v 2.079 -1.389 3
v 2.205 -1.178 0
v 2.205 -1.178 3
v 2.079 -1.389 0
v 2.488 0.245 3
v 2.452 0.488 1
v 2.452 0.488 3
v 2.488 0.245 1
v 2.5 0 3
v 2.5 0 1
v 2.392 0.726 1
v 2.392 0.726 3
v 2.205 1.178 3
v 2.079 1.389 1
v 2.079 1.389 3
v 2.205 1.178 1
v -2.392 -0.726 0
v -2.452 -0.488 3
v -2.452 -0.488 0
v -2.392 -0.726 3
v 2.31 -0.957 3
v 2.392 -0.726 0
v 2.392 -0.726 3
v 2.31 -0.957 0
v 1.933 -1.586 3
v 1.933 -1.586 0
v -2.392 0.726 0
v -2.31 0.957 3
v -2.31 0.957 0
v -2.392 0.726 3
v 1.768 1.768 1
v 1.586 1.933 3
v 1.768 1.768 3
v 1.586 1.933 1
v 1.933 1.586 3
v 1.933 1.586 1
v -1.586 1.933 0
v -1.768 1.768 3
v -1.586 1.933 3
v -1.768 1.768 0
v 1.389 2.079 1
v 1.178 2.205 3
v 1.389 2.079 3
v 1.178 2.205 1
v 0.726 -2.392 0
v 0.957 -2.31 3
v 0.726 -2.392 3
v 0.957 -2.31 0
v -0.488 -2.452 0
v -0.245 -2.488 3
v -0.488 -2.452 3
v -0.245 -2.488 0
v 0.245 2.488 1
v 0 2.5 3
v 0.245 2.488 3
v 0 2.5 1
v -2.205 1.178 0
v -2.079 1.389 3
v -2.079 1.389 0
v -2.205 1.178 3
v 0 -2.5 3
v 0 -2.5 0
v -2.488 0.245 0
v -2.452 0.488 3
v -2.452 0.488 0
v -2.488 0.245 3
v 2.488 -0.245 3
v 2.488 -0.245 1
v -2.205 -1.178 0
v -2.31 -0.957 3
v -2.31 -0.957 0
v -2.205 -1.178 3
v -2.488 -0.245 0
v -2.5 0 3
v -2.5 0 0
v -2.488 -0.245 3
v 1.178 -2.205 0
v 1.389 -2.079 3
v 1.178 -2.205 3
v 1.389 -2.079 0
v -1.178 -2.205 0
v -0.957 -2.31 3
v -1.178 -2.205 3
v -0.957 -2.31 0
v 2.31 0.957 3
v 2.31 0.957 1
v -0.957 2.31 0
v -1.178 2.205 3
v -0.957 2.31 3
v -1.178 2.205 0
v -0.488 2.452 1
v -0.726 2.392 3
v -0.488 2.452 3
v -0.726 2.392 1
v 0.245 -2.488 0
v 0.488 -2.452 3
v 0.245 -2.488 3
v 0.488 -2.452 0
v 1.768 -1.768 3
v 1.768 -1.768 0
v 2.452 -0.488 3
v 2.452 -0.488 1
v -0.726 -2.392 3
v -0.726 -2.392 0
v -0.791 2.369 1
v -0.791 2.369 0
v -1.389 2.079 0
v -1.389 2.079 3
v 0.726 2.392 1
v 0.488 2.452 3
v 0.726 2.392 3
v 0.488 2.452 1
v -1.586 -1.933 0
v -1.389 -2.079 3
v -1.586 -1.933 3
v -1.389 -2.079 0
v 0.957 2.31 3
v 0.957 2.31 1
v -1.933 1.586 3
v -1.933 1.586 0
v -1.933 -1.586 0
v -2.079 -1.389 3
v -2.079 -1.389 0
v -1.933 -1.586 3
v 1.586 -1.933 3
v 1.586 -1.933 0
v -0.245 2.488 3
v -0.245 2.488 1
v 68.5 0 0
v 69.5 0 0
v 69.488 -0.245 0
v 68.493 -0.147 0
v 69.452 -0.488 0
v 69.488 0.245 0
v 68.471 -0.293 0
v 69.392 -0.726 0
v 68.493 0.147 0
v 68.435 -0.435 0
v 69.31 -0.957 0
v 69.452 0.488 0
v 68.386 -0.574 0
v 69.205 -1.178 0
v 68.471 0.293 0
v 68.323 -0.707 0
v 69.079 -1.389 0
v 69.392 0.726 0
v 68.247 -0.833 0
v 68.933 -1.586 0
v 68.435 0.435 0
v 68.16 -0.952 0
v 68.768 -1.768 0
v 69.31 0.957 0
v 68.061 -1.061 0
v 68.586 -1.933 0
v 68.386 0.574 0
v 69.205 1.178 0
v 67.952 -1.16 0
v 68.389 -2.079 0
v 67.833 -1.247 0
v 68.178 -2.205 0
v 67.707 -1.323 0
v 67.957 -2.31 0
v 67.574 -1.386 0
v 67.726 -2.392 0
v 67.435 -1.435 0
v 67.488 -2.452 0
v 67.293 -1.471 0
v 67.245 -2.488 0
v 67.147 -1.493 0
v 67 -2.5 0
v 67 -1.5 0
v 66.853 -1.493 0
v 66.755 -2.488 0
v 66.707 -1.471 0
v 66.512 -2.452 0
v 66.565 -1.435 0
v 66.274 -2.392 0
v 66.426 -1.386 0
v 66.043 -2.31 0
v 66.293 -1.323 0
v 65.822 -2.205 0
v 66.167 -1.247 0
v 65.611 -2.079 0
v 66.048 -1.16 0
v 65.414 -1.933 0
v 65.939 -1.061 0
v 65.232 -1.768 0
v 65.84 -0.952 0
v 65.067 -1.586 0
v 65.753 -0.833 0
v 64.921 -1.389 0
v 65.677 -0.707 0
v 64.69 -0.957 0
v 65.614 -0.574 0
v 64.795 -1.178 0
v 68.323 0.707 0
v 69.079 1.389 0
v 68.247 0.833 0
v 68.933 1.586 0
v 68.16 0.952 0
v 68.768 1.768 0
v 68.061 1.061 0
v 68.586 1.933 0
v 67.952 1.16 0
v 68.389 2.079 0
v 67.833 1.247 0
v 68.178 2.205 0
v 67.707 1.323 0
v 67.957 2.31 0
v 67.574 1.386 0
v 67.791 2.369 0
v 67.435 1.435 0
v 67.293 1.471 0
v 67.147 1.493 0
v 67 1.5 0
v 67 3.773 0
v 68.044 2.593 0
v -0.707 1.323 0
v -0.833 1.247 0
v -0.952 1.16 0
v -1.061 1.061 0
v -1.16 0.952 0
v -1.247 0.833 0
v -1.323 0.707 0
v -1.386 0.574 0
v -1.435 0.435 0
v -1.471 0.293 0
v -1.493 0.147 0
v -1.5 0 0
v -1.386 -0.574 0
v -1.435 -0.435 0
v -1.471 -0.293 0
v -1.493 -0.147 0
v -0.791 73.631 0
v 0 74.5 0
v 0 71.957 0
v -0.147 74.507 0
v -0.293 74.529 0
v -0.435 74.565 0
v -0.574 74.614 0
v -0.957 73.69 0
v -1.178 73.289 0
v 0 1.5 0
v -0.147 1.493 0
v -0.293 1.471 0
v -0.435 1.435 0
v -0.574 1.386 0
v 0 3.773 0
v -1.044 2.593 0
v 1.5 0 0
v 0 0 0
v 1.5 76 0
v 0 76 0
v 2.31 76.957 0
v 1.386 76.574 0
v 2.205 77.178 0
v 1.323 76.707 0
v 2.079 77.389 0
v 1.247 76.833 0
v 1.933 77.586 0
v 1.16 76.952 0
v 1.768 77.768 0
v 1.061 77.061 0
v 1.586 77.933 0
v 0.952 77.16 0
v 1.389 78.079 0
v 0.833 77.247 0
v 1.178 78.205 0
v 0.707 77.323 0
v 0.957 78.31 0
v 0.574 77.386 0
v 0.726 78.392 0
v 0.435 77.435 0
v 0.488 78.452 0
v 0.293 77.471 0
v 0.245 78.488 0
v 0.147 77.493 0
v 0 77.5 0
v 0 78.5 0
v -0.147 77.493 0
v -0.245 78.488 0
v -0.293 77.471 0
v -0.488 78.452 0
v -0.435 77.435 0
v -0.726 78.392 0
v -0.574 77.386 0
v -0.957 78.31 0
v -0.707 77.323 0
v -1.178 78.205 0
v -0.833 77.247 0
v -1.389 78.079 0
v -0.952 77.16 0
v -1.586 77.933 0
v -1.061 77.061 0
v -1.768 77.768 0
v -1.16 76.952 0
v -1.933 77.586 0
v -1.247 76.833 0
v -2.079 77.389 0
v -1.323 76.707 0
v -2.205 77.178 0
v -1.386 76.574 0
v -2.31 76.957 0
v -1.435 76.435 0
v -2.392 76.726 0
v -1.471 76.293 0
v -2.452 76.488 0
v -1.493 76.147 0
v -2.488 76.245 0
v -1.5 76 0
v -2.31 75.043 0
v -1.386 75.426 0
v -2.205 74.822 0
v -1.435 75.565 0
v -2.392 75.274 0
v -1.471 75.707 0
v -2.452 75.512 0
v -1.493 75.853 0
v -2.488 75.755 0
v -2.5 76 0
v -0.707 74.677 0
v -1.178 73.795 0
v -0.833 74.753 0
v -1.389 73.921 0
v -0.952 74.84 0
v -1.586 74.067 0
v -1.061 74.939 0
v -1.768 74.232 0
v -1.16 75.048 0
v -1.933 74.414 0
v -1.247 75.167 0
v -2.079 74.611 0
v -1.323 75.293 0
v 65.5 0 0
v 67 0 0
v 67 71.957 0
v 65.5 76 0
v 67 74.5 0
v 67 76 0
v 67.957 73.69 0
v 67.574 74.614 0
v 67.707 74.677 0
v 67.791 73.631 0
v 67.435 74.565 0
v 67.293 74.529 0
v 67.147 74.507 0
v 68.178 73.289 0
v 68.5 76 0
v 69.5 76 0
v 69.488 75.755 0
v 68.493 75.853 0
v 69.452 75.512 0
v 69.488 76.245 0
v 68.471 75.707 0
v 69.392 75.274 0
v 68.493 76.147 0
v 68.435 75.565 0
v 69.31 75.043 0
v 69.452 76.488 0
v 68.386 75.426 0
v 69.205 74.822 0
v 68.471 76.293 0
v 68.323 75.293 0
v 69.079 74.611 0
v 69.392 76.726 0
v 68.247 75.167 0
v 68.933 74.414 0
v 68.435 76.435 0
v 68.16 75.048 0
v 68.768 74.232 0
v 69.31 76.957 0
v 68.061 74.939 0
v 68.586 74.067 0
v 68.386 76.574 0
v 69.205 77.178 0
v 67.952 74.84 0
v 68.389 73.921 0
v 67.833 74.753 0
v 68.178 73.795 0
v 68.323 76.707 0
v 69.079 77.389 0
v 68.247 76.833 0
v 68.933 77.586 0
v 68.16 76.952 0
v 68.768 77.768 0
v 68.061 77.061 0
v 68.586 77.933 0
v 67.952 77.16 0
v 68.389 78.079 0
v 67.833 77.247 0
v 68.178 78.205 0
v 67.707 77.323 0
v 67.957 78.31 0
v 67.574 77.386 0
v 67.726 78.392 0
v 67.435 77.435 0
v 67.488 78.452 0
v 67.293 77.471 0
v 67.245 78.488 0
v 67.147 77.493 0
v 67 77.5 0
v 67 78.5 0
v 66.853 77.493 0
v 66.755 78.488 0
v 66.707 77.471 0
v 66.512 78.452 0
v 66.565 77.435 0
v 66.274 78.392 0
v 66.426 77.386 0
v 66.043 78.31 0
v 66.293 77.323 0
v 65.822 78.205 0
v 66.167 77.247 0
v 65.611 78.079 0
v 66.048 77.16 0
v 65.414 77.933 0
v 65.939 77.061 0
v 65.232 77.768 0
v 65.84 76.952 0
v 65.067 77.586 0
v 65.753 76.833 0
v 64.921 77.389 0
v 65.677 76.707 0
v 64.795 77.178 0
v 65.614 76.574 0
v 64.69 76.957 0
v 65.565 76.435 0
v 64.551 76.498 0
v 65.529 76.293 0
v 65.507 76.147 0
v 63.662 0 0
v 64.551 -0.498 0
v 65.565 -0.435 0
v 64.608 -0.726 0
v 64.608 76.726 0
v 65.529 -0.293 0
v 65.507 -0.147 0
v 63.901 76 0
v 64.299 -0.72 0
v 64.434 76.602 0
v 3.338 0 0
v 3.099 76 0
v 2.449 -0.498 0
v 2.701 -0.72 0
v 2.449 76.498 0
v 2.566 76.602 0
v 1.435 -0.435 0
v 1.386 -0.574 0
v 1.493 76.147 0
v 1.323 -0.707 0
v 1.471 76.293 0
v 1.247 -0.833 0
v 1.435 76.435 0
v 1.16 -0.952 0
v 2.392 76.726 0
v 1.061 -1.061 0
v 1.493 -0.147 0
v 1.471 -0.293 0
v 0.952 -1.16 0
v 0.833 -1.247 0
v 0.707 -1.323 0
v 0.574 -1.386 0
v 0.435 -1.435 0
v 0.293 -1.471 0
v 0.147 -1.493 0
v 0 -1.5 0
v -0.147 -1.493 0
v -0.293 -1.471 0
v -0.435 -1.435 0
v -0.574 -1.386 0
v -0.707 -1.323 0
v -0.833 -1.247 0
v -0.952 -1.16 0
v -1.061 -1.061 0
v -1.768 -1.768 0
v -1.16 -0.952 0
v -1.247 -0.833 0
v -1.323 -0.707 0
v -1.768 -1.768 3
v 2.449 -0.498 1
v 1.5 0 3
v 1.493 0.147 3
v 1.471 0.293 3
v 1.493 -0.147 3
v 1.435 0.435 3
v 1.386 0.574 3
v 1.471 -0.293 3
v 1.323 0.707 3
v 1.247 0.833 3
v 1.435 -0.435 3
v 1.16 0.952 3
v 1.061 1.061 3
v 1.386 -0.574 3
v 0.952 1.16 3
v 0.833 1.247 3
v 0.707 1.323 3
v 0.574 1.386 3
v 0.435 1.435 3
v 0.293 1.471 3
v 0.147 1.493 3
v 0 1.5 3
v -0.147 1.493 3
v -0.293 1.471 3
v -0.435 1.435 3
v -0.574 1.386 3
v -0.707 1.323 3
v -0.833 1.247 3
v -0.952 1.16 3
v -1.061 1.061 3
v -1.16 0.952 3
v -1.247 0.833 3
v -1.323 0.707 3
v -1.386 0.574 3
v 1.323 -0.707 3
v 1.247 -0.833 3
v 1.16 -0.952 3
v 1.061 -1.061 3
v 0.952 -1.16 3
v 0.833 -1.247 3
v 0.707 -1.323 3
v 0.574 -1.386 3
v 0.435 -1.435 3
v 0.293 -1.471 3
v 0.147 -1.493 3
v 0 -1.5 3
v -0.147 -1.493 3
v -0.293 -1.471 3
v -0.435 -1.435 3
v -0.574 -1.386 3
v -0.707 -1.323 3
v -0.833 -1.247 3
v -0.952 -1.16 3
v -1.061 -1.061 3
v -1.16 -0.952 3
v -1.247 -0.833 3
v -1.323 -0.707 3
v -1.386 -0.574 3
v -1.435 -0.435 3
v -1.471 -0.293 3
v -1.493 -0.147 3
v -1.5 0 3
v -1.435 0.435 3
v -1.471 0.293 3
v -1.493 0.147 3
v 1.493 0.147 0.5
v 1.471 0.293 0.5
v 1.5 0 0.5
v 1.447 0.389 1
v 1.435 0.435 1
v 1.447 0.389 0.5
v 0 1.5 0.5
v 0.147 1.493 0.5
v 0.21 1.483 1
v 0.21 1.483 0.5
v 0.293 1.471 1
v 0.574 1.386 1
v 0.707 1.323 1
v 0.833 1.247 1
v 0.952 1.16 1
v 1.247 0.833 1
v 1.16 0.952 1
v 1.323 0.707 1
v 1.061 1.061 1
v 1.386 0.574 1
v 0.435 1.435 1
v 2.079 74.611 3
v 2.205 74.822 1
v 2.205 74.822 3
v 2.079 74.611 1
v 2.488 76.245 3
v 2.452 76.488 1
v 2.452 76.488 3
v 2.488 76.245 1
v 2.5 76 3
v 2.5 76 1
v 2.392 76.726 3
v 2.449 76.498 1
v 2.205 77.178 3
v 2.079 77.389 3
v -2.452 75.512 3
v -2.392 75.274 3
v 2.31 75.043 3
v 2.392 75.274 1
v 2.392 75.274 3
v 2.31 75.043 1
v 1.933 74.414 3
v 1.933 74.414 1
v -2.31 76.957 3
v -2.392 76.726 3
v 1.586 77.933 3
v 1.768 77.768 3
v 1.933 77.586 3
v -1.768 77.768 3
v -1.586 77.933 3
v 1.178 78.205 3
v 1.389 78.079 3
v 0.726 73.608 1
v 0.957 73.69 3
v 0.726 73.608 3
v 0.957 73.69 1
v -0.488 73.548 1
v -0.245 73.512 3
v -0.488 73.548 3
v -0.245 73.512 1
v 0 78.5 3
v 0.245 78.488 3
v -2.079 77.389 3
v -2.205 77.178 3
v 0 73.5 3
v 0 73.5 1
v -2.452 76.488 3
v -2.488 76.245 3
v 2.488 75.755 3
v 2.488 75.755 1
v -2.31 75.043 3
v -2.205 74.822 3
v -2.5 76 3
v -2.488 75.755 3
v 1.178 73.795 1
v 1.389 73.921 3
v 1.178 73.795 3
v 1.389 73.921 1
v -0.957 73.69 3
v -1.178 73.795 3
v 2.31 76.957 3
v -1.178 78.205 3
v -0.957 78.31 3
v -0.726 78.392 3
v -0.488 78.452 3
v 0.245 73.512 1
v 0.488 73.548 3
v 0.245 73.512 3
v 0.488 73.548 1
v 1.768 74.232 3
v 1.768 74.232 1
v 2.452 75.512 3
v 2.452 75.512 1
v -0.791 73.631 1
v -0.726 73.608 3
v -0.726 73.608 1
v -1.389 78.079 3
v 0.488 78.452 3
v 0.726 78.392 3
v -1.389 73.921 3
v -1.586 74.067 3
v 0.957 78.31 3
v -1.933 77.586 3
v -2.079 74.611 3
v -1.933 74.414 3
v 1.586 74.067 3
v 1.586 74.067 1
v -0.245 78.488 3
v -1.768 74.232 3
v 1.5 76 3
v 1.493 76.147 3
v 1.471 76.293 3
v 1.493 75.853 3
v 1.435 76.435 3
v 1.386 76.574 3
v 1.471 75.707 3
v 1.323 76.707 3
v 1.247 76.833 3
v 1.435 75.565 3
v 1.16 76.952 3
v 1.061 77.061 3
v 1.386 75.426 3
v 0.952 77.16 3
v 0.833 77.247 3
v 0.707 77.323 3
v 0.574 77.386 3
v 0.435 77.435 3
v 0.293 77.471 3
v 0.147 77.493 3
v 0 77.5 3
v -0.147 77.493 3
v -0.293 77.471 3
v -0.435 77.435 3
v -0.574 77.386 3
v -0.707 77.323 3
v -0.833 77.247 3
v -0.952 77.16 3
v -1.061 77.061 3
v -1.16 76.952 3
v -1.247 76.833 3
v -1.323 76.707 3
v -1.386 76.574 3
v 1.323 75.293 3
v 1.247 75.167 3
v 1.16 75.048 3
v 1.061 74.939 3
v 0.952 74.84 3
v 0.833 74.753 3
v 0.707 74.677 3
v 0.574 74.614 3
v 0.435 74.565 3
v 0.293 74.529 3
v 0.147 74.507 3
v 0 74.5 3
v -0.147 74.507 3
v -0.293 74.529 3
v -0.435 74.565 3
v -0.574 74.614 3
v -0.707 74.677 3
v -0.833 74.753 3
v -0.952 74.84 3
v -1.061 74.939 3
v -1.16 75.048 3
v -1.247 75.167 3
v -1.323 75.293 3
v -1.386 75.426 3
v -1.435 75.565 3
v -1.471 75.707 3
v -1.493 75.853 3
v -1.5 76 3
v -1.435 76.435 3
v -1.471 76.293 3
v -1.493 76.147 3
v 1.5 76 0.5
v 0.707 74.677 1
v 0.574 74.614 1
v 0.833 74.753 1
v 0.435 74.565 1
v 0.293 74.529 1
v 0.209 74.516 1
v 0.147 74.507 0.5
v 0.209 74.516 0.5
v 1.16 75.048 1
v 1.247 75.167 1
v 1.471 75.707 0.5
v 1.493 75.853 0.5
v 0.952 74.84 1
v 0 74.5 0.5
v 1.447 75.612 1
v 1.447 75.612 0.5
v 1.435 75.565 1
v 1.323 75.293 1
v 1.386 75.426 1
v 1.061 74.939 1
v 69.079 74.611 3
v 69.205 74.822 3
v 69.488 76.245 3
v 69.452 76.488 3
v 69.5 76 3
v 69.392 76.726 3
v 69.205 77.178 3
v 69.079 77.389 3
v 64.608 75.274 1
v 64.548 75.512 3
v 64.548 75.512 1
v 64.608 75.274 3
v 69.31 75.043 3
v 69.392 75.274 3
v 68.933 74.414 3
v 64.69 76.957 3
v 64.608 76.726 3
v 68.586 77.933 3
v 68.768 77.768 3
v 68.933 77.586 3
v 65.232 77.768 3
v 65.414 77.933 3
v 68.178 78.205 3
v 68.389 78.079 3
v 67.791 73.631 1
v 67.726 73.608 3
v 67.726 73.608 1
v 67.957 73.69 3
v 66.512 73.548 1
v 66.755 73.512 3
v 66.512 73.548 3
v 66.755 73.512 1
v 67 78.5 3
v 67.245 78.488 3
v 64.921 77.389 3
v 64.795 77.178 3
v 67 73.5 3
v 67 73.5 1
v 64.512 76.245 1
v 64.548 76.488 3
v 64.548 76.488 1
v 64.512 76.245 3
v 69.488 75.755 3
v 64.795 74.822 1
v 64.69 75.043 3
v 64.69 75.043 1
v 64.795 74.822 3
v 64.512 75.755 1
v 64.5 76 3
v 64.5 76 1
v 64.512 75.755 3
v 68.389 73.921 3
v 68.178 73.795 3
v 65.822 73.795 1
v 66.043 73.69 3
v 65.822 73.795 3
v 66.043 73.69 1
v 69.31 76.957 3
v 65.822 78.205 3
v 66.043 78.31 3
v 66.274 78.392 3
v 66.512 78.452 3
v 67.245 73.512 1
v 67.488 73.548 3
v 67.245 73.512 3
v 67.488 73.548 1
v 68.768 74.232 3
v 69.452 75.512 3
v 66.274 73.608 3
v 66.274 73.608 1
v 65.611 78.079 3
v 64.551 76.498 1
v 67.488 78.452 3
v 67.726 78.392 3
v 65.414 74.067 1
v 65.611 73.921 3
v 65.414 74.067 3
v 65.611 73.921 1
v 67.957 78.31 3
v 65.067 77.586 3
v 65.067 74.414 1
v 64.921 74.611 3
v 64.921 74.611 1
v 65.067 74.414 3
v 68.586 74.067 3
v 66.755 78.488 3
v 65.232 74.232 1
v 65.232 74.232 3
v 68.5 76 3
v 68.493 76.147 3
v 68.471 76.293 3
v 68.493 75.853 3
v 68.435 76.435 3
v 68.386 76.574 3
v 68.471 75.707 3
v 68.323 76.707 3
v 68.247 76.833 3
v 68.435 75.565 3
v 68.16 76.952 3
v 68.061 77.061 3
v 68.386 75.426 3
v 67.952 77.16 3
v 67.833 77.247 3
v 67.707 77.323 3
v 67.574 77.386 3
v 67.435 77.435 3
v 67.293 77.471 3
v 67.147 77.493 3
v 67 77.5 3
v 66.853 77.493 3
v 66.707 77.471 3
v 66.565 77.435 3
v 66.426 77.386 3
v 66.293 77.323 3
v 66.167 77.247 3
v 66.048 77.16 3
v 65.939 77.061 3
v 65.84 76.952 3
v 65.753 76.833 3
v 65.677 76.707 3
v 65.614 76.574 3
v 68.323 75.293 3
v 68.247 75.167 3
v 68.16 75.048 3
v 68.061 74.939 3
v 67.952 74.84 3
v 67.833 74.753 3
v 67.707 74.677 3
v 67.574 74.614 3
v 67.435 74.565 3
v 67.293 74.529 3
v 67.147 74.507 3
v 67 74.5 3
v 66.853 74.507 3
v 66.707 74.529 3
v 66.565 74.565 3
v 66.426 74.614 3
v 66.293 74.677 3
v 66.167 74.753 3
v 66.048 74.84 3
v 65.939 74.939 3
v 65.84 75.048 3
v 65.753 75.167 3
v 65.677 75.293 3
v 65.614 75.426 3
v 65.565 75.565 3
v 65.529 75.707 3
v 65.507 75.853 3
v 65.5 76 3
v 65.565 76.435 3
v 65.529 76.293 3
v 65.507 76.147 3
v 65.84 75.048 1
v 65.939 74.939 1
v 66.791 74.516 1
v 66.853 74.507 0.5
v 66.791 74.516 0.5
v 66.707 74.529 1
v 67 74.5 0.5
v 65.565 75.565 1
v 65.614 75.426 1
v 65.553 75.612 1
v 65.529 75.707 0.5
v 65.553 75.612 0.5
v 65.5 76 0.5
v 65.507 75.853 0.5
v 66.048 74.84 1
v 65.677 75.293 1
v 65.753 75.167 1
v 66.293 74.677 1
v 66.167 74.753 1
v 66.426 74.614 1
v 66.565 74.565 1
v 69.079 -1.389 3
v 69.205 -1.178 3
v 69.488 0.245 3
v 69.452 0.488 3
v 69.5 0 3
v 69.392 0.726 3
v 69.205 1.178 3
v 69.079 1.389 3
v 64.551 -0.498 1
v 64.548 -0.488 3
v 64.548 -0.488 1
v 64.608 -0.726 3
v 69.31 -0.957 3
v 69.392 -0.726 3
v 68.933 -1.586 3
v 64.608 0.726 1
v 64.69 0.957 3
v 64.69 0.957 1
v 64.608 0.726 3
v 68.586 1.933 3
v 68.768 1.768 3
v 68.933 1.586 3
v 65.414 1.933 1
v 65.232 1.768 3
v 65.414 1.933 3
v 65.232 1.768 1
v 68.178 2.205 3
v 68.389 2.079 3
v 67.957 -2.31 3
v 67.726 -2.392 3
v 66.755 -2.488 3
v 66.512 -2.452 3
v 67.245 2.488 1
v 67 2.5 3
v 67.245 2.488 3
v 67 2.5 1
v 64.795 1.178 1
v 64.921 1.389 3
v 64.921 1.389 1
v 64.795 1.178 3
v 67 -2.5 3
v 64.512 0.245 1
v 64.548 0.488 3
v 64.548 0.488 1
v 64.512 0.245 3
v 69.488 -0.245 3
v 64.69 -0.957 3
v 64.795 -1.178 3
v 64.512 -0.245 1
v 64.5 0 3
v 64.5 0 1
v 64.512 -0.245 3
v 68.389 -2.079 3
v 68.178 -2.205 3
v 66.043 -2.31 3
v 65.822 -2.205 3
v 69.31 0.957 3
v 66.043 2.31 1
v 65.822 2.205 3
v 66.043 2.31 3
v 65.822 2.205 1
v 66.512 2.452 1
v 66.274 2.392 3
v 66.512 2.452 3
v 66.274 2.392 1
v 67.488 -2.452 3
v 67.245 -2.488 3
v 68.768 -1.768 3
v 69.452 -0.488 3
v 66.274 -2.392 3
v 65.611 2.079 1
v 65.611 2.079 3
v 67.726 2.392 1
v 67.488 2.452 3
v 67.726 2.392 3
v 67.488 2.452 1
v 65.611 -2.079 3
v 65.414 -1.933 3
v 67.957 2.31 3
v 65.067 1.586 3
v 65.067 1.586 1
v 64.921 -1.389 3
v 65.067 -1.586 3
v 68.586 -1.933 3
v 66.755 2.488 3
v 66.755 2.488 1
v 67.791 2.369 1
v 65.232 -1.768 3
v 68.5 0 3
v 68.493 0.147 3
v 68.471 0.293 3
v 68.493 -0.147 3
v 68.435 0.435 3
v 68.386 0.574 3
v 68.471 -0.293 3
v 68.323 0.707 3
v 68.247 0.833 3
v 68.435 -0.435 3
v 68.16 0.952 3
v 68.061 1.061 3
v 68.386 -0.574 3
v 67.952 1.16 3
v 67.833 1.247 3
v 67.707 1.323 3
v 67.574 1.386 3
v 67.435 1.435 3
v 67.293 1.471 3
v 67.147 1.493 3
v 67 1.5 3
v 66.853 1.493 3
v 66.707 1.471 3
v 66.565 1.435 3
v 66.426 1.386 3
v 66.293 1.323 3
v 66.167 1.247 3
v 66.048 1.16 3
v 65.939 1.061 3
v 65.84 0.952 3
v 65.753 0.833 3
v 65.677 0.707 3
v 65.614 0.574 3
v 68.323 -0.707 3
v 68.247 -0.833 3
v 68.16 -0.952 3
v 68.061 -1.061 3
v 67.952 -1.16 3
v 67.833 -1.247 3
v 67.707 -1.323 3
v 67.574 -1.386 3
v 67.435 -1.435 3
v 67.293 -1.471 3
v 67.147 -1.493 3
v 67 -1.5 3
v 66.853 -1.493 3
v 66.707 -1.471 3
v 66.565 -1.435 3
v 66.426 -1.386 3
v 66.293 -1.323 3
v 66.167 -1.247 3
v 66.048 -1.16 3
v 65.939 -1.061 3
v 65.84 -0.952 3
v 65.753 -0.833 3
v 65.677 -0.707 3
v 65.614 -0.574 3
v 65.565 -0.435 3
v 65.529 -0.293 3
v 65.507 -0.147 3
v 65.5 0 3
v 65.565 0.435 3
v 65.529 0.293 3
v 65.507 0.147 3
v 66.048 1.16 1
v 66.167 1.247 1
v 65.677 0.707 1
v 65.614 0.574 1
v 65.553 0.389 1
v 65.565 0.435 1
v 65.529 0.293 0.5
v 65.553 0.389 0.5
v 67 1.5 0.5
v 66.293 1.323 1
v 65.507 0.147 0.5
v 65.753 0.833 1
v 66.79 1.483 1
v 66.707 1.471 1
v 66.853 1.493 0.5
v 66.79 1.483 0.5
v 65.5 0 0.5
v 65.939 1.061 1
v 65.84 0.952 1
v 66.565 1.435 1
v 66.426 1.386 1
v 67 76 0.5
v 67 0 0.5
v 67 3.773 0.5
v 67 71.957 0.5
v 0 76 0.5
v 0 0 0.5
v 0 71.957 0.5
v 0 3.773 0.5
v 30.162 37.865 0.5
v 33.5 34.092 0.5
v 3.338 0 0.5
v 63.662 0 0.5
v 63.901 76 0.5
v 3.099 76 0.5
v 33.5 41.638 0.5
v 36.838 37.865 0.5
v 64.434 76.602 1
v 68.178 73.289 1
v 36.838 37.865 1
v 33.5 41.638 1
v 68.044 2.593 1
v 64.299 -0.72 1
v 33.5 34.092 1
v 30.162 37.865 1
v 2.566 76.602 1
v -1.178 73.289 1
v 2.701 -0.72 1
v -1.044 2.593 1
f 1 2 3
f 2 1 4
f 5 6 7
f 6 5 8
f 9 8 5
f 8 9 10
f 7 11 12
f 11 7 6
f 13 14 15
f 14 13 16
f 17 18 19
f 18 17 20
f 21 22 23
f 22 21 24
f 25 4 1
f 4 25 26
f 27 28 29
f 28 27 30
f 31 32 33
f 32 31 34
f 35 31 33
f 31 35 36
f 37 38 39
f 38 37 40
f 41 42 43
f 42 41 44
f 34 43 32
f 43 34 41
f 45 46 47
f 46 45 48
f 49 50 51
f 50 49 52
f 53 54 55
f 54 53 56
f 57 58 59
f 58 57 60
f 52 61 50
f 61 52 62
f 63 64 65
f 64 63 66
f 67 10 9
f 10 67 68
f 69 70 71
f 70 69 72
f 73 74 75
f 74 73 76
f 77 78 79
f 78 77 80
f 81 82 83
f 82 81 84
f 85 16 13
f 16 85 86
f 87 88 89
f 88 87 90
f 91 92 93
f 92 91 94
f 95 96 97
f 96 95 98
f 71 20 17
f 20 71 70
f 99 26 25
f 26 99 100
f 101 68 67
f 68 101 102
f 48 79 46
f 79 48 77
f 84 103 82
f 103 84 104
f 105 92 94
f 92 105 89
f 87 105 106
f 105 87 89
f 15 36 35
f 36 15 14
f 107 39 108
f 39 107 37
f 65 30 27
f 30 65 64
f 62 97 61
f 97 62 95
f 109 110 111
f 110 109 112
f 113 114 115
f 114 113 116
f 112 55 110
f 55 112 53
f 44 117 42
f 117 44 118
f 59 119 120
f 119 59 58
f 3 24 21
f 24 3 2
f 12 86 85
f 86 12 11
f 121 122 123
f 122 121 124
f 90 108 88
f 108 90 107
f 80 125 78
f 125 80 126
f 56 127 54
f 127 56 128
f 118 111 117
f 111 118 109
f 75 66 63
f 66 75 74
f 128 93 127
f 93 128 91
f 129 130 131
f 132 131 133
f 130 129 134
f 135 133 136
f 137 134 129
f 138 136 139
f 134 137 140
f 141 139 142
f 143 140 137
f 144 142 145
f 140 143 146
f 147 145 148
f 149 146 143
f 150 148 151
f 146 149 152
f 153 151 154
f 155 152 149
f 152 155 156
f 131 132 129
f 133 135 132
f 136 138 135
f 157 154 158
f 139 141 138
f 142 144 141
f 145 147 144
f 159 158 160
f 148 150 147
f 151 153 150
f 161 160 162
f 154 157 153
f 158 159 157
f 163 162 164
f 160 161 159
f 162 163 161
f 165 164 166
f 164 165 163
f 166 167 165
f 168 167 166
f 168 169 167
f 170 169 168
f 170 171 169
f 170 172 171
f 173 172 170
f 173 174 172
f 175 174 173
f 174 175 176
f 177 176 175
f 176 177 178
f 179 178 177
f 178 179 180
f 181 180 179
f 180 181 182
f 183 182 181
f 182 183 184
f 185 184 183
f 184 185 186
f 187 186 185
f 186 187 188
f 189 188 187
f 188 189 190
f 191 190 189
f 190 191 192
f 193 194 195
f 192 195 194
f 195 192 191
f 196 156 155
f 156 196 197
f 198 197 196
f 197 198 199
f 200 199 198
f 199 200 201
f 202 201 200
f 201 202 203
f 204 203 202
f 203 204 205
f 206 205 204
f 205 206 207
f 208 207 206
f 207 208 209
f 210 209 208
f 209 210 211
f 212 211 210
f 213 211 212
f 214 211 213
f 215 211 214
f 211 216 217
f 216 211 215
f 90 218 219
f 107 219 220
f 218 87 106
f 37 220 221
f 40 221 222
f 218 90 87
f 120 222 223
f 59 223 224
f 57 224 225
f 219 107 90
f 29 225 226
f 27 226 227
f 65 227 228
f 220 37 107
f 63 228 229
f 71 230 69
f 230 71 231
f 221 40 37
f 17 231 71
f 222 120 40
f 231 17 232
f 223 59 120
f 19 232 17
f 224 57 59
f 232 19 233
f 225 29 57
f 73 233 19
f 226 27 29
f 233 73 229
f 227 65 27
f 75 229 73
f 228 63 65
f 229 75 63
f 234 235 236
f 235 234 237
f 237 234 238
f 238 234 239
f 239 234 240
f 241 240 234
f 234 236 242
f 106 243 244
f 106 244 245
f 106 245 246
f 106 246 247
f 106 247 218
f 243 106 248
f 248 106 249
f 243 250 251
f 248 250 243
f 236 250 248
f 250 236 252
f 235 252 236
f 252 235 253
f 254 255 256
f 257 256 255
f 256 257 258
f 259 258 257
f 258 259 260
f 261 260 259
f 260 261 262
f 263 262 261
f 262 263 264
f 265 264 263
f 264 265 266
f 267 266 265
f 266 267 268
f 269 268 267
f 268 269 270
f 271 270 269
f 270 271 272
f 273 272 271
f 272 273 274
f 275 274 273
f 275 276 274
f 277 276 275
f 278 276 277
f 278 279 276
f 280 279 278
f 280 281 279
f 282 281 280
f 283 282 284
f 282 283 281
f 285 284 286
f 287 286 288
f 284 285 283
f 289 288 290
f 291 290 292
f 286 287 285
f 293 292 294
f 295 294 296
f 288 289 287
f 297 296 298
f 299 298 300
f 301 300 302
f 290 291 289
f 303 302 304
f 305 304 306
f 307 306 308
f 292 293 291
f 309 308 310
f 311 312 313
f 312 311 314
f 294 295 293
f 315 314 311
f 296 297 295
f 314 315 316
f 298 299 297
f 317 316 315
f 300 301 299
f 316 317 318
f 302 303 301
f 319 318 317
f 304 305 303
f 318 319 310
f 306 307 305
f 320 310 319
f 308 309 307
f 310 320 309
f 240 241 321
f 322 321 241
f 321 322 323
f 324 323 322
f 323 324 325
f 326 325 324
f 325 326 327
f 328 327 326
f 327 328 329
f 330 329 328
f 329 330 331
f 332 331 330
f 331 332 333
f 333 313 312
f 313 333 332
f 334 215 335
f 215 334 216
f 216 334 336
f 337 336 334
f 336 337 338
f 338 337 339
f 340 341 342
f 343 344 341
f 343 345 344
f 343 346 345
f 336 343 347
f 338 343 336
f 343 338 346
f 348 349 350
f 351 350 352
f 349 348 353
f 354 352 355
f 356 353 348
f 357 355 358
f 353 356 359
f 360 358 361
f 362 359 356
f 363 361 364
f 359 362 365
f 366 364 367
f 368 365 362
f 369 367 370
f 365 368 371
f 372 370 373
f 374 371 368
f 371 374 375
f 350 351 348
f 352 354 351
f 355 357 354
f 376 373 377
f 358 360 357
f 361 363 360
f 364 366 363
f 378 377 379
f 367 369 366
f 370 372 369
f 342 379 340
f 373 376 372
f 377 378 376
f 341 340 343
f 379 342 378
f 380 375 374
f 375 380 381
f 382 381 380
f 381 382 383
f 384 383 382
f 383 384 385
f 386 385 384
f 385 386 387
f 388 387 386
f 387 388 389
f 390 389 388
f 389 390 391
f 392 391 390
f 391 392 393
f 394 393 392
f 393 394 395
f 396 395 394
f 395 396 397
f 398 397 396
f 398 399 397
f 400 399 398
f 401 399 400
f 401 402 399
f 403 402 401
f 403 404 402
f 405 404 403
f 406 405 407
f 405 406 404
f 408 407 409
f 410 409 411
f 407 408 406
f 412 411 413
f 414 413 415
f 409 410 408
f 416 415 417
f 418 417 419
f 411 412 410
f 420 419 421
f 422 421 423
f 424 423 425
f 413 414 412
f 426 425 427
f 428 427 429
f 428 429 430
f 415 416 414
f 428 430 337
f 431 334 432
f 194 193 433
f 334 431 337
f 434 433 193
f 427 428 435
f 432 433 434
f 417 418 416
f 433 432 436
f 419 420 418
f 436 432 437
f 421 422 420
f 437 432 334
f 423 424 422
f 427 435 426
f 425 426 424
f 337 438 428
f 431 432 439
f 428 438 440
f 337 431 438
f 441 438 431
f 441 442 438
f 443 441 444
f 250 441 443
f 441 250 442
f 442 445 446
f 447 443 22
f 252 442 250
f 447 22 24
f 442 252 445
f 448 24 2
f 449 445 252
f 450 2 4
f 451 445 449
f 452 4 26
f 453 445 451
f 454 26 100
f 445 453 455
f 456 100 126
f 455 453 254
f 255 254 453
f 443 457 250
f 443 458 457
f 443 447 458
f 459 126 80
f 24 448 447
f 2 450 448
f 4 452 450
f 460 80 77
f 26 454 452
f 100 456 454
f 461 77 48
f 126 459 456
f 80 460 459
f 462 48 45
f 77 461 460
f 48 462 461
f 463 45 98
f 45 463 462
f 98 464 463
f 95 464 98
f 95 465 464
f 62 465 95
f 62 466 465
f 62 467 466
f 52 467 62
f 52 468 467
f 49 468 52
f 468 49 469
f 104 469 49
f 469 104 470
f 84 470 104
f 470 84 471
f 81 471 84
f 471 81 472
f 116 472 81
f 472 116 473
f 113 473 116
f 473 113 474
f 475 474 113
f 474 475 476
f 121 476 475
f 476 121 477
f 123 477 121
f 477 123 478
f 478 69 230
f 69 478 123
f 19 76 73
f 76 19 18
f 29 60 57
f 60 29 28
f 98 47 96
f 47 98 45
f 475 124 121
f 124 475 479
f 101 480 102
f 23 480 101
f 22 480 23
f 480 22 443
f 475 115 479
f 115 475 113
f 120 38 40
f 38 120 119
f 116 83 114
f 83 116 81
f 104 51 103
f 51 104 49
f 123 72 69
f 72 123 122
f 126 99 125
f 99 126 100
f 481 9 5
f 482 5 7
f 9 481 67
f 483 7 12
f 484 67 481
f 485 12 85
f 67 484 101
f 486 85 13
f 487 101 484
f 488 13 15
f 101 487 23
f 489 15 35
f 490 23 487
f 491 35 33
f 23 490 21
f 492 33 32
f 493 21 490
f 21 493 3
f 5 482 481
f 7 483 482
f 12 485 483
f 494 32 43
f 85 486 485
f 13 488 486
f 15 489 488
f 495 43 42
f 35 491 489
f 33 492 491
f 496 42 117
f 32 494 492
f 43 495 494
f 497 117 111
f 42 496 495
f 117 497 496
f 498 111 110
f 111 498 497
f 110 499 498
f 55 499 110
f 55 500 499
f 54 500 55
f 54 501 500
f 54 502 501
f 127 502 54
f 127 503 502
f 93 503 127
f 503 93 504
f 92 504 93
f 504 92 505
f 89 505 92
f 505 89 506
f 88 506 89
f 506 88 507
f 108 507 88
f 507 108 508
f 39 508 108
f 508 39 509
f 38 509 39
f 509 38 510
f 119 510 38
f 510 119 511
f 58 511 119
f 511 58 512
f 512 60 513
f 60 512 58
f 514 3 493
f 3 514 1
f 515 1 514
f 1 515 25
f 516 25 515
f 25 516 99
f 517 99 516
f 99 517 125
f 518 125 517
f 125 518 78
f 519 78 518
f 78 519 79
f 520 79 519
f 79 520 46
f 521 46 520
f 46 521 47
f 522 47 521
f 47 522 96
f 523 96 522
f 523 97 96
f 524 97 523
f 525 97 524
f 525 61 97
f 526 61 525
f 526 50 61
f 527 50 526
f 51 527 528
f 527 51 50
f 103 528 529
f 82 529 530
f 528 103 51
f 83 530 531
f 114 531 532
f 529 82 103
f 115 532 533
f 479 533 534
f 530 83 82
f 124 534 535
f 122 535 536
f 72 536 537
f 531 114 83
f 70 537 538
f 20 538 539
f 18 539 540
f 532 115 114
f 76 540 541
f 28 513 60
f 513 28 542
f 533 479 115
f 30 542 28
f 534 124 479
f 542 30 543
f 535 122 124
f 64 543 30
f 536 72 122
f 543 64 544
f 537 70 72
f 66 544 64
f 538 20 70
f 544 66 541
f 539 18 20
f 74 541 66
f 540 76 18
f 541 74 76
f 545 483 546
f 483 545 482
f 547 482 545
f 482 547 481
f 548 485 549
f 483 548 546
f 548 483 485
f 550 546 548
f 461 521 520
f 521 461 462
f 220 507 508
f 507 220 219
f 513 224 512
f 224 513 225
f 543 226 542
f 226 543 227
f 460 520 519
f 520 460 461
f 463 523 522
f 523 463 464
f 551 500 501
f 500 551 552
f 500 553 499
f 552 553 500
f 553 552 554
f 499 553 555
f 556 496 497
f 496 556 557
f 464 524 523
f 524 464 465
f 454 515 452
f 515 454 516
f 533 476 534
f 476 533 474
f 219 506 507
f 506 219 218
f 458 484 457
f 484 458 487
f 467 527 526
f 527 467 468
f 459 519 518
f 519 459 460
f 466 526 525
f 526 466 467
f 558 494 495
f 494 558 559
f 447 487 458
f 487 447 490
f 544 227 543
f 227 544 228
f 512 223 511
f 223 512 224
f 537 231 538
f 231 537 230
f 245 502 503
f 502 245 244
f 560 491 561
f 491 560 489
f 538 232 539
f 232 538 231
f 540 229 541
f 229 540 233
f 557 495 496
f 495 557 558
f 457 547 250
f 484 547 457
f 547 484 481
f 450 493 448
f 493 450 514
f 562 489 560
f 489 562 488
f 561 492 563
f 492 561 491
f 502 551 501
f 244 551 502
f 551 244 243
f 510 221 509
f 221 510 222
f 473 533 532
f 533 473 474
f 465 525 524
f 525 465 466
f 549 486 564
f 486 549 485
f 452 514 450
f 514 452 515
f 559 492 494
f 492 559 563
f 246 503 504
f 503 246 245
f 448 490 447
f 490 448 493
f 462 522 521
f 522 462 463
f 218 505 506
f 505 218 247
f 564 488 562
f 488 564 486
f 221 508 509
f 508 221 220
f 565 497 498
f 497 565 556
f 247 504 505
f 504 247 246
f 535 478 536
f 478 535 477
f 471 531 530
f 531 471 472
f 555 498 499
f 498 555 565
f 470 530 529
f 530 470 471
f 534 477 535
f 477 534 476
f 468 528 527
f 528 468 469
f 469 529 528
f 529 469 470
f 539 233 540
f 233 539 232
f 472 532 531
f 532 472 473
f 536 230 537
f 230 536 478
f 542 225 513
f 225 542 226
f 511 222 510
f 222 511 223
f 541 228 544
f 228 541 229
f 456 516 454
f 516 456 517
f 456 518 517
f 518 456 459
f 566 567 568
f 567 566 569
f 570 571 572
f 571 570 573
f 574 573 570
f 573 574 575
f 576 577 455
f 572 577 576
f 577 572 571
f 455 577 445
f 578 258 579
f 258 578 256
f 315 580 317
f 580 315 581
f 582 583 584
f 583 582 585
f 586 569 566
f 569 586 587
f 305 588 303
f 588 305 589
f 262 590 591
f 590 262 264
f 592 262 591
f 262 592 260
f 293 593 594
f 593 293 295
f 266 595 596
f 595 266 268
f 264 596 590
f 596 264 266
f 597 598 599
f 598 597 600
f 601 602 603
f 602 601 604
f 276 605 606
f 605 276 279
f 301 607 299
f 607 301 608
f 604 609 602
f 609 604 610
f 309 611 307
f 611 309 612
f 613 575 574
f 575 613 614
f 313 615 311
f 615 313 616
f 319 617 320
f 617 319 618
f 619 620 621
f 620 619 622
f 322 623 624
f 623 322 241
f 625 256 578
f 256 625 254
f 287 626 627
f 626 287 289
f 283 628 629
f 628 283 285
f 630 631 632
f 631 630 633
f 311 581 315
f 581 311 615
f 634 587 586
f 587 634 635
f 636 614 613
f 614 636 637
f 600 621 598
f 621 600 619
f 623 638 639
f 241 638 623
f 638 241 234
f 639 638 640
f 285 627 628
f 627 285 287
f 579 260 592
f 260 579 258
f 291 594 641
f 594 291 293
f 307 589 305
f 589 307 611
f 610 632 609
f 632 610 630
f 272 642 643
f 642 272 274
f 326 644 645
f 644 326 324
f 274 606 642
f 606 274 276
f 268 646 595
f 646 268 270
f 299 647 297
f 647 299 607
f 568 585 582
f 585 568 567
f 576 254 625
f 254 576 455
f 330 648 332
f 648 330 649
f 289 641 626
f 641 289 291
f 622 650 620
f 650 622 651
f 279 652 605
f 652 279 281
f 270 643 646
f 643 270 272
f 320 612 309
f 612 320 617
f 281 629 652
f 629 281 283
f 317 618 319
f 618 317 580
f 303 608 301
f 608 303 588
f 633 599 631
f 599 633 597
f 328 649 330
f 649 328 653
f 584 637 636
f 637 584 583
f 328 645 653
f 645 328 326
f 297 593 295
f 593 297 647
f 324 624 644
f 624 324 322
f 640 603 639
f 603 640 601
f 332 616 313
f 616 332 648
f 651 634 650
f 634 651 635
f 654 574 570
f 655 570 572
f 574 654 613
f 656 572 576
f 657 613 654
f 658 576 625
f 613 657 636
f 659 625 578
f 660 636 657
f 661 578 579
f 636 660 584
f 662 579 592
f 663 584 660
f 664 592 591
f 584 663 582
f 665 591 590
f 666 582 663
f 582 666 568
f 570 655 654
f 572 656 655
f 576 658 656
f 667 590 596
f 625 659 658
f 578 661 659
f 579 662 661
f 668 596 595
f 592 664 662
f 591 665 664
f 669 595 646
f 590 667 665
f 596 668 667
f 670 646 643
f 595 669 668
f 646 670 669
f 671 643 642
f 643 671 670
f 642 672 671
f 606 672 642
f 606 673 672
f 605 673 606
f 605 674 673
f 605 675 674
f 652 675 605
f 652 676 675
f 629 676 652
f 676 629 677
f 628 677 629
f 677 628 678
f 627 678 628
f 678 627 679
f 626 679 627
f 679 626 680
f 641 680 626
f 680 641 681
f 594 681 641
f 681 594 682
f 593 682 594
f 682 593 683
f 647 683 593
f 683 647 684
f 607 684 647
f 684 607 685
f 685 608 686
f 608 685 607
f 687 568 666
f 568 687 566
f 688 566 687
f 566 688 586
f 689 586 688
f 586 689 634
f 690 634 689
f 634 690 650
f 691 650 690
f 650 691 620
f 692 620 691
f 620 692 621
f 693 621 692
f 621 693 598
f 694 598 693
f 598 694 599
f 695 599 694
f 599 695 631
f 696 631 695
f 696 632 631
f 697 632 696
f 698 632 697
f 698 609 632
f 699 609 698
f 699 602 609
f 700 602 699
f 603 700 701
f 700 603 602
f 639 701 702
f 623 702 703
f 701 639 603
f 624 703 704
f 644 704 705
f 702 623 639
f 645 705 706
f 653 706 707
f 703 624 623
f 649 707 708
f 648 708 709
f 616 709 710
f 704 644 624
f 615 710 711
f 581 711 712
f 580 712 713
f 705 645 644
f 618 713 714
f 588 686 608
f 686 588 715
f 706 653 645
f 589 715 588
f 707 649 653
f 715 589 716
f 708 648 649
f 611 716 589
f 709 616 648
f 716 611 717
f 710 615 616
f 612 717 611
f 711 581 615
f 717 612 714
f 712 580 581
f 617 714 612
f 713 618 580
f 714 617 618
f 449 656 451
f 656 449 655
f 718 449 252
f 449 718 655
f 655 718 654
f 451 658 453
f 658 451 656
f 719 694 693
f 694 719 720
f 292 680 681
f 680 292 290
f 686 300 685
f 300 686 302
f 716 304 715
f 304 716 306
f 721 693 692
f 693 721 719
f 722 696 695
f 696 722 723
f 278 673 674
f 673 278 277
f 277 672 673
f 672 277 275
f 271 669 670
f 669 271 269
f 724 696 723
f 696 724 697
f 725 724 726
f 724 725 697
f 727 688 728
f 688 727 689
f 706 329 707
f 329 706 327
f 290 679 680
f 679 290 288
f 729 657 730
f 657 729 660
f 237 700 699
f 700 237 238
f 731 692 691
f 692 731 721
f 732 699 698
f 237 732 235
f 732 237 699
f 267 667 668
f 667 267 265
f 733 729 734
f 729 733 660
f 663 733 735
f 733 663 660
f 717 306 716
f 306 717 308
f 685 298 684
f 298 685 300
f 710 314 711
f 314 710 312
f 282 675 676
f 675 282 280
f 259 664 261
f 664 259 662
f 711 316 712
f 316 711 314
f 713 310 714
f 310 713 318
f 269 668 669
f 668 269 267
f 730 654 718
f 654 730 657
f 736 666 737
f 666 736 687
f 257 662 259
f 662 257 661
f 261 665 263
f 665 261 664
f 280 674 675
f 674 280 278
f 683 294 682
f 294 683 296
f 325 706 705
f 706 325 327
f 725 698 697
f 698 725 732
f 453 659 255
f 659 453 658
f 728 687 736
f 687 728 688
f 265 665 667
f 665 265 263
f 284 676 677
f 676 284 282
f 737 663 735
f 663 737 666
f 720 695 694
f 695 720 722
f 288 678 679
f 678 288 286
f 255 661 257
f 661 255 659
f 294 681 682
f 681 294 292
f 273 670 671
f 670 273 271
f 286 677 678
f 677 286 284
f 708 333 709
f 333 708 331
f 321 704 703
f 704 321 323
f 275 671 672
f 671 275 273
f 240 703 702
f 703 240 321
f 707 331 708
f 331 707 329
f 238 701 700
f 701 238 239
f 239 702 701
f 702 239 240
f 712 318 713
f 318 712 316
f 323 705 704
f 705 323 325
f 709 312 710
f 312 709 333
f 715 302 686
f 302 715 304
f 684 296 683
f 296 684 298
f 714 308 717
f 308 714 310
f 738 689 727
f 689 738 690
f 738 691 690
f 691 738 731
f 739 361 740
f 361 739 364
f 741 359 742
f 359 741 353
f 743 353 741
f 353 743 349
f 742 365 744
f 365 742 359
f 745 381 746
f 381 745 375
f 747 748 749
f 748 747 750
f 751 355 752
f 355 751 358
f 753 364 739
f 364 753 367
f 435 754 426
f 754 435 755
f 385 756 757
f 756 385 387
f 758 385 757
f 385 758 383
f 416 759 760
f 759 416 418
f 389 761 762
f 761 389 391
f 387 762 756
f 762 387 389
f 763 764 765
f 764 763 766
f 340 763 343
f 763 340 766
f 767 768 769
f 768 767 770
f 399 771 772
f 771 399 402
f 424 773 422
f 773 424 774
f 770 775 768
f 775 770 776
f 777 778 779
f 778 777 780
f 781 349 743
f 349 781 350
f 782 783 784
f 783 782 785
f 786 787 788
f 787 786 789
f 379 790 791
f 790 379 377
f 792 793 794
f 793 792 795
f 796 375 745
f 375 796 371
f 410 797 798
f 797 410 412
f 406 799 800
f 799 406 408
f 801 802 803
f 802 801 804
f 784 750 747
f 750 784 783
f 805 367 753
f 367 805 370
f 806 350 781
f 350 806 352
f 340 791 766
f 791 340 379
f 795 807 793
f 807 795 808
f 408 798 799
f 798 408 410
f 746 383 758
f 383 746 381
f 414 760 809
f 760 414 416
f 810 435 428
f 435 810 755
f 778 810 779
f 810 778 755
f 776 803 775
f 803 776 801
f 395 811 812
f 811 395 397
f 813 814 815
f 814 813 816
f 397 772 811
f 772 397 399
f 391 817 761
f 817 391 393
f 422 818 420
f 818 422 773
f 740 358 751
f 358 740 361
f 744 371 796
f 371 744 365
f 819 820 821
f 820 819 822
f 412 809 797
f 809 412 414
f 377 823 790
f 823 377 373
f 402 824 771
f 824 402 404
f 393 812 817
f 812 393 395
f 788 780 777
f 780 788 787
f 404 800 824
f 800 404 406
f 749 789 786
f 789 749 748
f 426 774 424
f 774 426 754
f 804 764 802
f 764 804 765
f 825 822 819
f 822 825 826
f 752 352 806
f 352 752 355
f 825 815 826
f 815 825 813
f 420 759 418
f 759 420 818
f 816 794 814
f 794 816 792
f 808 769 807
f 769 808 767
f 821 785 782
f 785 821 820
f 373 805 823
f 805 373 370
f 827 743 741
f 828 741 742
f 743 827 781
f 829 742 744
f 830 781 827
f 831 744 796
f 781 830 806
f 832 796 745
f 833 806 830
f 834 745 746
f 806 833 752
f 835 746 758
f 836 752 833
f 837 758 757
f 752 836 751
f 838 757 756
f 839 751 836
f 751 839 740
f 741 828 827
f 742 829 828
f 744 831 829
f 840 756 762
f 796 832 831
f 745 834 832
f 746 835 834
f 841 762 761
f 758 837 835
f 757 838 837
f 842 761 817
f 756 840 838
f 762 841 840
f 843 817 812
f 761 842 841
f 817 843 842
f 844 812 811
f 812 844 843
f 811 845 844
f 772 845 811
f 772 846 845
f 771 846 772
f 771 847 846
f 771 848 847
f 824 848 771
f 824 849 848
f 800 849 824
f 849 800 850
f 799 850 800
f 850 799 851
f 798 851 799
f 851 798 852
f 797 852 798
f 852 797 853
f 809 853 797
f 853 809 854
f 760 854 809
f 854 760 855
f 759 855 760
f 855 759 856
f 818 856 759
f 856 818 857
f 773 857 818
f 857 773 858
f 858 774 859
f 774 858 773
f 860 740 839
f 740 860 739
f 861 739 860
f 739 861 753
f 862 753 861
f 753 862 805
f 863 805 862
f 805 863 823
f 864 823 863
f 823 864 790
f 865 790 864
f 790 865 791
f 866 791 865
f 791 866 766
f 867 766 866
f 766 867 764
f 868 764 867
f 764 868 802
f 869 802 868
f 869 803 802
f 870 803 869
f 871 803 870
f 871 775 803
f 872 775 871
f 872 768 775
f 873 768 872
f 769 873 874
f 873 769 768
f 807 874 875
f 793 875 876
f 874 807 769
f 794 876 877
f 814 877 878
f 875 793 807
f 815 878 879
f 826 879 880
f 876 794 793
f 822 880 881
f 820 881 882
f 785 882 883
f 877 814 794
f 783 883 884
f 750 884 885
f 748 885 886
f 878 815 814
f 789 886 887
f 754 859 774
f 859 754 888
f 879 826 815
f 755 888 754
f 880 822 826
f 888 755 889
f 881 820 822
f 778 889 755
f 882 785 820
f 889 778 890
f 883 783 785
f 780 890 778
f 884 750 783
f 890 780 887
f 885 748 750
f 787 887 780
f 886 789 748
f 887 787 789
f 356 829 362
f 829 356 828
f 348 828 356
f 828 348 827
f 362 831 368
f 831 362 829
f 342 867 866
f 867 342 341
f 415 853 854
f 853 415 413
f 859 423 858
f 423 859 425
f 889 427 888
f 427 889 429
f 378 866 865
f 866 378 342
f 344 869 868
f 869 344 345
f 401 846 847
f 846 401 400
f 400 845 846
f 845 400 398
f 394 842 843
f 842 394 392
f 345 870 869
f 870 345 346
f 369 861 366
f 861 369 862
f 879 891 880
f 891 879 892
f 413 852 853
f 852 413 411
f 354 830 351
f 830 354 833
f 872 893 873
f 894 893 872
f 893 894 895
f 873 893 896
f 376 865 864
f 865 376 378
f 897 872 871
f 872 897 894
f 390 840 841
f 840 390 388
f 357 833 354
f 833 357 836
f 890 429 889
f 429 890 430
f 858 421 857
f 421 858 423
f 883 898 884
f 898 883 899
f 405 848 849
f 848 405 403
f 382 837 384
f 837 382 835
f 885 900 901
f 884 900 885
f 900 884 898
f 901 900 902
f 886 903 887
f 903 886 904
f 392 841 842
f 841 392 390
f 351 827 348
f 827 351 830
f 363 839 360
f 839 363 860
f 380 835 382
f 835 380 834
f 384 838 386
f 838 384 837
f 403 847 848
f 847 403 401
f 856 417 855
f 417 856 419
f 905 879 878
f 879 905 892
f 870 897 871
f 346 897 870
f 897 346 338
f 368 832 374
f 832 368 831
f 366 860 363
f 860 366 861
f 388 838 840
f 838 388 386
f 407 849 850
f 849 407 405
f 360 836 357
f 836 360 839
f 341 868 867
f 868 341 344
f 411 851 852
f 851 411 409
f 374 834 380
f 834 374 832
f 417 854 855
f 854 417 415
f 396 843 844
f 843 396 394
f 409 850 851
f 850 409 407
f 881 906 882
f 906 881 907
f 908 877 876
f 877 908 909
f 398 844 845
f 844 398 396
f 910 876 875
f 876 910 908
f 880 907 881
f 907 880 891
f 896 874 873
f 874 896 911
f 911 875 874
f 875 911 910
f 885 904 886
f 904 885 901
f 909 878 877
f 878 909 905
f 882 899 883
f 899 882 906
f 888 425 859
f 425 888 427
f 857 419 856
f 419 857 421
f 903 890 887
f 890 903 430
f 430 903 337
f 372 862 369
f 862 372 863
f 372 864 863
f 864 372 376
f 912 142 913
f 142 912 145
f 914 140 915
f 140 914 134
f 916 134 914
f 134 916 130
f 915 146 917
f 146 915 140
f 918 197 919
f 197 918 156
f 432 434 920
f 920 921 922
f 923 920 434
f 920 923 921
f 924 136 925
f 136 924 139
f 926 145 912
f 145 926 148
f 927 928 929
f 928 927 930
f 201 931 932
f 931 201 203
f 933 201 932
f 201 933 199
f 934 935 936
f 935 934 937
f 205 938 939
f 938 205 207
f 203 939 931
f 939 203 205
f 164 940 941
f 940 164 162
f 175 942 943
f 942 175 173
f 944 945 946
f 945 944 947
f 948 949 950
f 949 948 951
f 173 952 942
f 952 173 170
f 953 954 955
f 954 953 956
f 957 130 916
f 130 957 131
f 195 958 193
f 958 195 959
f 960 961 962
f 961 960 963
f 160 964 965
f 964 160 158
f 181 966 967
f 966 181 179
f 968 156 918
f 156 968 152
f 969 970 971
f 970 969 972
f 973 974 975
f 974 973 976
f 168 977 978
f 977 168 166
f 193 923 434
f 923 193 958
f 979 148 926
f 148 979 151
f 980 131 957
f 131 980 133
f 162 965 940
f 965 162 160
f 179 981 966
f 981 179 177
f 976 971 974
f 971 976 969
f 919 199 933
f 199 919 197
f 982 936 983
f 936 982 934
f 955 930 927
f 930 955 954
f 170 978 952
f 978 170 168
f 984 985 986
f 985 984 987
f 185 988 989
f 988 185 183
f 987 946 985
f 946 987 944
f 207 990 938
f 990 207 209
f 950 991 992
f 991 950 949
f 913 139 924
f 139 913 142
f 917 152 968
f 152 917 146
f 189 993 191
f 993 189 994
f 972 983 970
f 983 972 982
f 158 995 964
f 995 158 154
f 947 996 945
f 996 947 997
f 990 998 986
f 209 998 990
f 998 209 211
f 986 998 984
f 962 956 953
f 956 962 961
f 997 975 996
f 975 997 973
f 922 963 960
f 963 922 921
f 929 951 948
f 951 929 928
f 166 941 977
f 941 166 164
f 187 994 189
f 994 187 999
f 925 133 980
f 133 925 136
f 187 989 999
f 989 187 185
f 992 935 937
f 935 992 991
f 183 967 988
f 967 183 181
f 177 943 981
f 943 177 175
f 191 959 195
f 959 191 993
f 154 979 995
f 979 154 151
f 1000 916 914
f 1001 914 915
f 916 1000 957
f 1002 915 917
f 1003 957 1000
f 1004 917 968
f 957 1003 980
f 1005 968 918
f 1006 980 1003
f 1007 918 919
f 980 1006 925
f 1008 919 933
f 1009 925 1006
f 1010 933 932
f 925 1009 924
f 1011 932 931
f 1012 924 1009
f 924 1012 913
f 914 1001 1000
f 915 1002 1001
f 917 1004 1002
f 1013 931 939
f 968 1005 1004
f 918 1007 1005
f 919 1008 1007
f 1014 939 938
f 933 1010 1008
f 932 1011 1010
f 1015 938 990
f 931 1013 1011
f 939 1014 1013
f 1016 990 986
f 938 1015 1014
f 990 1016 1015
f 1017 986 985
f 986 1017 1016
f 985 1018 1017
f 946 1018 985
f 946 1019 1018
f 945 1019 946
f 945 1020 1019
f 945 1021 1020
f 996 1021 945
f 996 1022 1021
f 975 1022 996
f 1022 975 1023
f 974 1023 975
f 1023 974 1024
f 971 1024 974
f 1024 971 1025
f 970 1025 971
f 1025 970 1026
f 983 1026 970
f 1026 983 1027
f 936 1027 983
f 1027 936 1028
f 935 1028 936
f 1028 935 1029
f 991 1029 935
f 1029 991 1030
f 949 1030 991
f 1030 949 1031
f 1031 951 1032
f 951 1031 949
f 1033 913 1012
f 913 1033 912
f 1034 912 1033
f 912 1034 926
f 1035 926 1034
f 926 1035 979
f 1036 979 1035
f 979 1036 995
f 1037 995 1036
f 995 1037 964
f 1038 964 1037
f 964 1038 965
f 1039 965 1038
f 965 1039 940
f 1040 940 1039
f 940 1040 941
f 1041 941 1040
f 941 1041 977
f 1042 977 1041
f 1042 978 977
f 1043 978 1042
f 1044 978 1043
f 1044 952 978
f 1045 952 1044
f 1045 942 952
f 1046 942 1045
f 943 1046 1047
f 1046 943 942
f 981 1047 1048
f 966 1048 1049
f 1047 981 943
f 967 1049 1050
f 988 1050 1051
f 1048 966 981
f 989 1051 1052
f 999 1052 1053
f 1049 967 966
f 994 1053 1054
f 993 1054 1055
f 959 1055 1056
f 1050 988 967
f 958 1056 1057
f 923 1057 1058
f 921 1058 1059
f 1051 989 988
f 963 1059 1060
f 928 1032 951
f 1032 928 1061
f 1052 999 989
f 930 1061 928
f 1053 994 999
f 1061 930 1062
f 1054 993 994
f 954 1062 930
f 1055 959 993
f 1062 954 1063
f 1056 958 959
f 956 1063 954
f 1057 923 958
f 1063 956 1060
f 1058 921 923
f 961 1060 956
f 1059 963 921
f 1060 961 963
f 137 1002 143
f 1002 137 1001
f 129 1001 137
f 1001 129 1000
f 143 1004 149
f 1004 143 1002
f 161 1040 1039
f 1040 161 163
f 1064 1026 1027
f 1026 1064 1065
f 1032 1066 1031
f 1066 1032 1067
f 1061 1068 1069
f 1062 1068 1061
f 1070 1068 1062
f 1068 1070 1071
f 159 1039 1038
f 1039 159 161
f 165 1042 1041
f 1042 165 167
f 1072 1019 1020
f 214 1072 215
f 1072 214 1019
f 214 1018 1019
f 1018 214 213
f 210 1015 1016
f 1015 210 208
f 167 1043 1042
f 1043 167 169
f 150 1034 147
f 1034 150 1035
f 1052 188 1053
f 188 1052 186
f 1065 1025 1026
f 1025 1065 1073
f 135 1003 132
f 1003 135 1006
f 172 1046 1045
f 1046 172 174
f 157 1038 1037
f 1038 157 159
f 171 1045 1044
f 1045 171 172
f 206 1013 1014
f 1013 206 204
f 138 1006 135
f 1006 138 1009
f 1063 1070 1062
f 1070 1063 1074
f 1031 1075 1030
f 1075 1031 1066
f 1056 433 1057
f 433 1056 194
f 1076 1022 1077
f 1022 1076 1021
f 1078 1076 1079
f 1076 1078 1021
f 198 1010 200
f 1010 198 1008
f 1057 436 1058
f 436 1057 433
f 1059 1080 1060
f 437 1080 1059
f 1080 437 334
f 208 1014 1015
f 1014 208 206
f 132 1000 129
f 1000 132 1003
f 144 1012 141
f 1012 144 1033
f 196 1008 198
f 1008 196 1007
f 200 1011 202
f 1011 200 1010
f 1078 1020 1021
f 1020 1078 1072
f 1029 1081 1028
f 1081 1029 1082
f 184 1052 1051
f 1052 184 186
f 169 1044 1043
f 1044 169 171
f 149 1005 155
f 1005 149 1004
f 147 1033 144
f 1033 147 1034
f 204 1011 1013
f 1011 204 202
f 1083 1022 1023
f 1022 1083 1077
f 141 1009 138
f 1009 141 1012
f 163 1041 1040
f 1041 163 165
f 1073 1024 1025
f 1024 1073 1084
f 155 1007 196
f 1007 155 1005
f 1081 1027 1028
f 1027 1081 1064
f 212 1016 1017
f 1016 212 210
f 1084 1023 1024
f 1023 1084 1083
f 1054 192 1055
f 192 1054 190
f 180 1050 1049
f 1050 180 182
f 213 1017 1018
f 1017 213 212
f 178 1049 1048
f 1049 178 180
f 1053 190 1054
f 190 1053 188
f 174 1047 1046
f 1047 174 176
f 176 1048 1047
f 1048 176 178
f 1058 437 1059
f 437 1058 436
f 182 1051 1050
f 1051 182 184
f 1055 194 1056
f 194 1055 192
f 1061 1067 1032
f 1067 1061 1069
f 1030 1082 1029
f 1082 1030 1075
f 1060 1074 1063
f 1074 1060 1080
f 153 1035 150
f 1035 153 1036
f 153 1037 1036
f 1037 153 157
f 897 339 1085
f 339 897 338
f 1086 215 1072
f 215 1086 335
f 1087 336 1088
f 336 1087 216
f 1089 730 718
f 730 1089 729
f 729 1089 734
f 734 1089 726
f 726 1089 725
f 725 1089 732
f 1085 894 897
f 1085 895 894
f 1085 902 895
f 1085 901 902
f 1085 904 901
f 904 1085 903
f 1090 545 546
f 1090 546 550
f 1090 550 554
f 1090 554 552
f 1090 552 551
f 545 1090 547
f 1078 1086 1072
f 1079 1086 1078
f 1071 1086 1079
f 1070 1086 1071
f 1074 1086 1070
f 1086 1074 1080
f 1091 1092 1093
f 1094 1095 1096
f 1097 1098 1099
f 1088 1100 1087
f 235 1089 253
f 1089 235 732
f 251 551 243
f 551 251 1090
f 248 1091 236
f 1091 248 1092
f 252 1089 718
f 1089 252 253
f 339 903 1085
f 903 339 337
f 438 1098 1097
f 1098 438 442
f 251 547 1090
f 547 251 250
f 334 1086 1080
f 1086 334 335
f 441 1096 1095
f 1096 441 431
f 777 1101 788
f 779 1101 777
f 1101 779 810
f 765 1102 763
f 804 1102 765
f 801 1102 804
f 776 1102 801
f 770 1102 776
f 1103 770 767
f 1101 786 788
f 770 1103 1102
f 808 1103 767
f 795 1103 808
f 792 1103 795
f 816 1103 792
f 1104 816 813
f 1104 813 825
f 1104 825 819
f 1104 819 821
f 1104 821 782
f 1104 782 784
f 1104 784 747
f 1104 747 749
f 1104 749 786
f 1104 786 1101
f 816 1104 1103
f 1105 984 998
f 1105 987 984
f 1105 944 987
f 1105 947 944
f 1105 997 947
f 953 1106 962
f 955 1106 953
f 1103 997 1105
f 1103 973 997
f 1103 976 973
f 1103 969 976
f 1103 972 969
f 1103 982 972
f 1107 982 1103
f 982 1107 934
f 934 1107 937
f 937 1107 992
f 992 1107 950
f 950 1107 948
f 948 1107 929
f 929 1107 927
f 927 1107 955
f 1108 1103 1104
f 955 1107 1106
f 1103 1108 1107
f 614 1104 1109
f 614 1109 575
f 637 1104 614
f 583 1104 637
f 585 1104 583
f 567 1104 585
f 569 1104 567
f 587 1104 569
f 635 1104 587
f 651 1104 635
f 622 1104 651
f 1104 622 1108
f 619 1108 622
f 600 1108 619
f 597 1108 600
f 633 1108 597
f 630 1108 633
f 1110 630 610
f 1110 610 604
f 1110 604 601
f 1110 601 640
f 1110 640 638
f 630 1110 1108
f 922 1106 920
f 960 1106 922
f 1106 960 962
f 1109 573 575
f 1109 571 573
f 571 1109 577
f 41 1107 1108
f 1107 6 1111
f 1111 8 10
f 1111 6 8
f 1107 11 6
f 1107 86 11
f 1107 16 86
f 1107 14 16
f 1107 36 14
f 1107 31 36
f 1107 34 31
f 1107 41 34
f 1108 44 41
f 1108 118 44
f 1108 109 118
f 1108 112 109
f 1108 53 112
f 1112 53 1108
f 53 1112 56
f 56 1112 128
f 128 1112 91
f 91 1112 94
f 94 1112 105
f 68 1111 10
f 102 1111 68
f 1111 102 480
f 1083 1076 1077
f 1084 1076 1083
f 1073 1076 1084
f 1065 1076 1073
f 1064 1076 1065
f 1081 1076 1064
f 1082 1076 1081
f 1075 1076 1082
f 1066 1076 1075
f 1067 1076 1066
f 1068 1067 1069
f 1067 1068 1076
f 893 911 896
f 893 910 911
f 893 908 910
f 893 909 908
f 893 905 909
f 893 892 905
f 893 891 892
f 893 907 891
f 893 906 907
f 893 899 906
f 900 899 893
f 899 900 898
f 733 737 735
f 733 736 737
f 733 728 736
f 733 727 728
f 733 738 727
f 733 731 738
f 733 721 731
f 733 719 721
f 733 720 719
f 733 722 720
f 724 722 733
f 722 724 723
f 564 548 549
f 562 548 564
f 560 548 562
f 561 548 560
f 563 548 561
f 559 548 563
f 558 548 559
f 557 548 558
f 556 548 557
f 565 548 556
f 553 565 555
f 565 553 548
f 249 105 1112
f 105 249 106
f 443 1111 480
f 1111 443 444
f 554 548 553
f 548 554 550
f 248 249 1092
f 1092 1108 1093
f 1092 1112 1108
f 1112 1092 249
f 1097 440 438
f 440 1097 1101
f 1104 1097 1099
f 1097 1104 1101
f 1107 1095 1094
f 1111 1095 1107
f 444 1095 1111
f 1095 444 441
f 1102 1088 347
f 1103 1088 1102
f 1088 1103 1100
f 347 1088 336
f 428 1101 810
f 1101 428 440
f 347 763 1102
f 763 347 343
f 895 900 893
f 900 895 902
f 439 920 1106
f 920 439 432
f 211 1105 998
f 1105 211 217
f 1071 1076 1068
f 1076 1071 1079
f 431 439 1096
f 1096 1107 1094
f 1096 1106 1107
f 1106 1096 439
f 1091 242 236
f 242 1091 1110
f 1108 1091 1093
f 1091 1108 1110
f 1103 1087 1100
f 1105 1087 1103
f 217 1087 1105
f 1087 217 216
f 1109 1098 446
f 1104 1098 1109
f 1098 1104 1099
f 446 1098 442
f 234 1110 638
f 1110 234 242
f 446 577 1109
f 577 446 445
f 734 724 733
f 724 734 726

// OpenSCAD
hole_diameter = 5;
screw_head_diameter = 3;

  
y_width = 76;
x_width = 67;
diagonale = sqrt(x_width * x_width + y_width * y_width) - hole_diameter / 2;
height = 1;
// 24
thick = 0.5;
// 2
module pillar(xoffset, yoffset) {
  translate(xoffset, yoffset, 0) {
    difference() {
      cylinder(d=hole_diameter, h = height + 2, $fn=64);
      cylinder(d=screw_head_diameter, h = height + 4, $fn=64);
    }
  }
}


cube(size = [x_width, y_width, thick]);
rotate(a = [0, 0, 48.5]) {
  translate([hole_diameter / 4, - hole_diameter / 2, 0]) {
      #cube(size = [diagonale, hole_diameter, height]);
  }
}
translate([x_width, 0, 0]) {
  rotate(a = [0, 0, 41.5 + 90]) {
    translate([hole_diameter / 4, - hole_diameter / 2, 0]) {
      cube(size = [diagonale, hole_diameter, height]);
    }
  }
}

pillar([0, 0]);
pillar([0, y_width]);
pillar([x_width, y_width]);
pillar([x_width, 0]);
